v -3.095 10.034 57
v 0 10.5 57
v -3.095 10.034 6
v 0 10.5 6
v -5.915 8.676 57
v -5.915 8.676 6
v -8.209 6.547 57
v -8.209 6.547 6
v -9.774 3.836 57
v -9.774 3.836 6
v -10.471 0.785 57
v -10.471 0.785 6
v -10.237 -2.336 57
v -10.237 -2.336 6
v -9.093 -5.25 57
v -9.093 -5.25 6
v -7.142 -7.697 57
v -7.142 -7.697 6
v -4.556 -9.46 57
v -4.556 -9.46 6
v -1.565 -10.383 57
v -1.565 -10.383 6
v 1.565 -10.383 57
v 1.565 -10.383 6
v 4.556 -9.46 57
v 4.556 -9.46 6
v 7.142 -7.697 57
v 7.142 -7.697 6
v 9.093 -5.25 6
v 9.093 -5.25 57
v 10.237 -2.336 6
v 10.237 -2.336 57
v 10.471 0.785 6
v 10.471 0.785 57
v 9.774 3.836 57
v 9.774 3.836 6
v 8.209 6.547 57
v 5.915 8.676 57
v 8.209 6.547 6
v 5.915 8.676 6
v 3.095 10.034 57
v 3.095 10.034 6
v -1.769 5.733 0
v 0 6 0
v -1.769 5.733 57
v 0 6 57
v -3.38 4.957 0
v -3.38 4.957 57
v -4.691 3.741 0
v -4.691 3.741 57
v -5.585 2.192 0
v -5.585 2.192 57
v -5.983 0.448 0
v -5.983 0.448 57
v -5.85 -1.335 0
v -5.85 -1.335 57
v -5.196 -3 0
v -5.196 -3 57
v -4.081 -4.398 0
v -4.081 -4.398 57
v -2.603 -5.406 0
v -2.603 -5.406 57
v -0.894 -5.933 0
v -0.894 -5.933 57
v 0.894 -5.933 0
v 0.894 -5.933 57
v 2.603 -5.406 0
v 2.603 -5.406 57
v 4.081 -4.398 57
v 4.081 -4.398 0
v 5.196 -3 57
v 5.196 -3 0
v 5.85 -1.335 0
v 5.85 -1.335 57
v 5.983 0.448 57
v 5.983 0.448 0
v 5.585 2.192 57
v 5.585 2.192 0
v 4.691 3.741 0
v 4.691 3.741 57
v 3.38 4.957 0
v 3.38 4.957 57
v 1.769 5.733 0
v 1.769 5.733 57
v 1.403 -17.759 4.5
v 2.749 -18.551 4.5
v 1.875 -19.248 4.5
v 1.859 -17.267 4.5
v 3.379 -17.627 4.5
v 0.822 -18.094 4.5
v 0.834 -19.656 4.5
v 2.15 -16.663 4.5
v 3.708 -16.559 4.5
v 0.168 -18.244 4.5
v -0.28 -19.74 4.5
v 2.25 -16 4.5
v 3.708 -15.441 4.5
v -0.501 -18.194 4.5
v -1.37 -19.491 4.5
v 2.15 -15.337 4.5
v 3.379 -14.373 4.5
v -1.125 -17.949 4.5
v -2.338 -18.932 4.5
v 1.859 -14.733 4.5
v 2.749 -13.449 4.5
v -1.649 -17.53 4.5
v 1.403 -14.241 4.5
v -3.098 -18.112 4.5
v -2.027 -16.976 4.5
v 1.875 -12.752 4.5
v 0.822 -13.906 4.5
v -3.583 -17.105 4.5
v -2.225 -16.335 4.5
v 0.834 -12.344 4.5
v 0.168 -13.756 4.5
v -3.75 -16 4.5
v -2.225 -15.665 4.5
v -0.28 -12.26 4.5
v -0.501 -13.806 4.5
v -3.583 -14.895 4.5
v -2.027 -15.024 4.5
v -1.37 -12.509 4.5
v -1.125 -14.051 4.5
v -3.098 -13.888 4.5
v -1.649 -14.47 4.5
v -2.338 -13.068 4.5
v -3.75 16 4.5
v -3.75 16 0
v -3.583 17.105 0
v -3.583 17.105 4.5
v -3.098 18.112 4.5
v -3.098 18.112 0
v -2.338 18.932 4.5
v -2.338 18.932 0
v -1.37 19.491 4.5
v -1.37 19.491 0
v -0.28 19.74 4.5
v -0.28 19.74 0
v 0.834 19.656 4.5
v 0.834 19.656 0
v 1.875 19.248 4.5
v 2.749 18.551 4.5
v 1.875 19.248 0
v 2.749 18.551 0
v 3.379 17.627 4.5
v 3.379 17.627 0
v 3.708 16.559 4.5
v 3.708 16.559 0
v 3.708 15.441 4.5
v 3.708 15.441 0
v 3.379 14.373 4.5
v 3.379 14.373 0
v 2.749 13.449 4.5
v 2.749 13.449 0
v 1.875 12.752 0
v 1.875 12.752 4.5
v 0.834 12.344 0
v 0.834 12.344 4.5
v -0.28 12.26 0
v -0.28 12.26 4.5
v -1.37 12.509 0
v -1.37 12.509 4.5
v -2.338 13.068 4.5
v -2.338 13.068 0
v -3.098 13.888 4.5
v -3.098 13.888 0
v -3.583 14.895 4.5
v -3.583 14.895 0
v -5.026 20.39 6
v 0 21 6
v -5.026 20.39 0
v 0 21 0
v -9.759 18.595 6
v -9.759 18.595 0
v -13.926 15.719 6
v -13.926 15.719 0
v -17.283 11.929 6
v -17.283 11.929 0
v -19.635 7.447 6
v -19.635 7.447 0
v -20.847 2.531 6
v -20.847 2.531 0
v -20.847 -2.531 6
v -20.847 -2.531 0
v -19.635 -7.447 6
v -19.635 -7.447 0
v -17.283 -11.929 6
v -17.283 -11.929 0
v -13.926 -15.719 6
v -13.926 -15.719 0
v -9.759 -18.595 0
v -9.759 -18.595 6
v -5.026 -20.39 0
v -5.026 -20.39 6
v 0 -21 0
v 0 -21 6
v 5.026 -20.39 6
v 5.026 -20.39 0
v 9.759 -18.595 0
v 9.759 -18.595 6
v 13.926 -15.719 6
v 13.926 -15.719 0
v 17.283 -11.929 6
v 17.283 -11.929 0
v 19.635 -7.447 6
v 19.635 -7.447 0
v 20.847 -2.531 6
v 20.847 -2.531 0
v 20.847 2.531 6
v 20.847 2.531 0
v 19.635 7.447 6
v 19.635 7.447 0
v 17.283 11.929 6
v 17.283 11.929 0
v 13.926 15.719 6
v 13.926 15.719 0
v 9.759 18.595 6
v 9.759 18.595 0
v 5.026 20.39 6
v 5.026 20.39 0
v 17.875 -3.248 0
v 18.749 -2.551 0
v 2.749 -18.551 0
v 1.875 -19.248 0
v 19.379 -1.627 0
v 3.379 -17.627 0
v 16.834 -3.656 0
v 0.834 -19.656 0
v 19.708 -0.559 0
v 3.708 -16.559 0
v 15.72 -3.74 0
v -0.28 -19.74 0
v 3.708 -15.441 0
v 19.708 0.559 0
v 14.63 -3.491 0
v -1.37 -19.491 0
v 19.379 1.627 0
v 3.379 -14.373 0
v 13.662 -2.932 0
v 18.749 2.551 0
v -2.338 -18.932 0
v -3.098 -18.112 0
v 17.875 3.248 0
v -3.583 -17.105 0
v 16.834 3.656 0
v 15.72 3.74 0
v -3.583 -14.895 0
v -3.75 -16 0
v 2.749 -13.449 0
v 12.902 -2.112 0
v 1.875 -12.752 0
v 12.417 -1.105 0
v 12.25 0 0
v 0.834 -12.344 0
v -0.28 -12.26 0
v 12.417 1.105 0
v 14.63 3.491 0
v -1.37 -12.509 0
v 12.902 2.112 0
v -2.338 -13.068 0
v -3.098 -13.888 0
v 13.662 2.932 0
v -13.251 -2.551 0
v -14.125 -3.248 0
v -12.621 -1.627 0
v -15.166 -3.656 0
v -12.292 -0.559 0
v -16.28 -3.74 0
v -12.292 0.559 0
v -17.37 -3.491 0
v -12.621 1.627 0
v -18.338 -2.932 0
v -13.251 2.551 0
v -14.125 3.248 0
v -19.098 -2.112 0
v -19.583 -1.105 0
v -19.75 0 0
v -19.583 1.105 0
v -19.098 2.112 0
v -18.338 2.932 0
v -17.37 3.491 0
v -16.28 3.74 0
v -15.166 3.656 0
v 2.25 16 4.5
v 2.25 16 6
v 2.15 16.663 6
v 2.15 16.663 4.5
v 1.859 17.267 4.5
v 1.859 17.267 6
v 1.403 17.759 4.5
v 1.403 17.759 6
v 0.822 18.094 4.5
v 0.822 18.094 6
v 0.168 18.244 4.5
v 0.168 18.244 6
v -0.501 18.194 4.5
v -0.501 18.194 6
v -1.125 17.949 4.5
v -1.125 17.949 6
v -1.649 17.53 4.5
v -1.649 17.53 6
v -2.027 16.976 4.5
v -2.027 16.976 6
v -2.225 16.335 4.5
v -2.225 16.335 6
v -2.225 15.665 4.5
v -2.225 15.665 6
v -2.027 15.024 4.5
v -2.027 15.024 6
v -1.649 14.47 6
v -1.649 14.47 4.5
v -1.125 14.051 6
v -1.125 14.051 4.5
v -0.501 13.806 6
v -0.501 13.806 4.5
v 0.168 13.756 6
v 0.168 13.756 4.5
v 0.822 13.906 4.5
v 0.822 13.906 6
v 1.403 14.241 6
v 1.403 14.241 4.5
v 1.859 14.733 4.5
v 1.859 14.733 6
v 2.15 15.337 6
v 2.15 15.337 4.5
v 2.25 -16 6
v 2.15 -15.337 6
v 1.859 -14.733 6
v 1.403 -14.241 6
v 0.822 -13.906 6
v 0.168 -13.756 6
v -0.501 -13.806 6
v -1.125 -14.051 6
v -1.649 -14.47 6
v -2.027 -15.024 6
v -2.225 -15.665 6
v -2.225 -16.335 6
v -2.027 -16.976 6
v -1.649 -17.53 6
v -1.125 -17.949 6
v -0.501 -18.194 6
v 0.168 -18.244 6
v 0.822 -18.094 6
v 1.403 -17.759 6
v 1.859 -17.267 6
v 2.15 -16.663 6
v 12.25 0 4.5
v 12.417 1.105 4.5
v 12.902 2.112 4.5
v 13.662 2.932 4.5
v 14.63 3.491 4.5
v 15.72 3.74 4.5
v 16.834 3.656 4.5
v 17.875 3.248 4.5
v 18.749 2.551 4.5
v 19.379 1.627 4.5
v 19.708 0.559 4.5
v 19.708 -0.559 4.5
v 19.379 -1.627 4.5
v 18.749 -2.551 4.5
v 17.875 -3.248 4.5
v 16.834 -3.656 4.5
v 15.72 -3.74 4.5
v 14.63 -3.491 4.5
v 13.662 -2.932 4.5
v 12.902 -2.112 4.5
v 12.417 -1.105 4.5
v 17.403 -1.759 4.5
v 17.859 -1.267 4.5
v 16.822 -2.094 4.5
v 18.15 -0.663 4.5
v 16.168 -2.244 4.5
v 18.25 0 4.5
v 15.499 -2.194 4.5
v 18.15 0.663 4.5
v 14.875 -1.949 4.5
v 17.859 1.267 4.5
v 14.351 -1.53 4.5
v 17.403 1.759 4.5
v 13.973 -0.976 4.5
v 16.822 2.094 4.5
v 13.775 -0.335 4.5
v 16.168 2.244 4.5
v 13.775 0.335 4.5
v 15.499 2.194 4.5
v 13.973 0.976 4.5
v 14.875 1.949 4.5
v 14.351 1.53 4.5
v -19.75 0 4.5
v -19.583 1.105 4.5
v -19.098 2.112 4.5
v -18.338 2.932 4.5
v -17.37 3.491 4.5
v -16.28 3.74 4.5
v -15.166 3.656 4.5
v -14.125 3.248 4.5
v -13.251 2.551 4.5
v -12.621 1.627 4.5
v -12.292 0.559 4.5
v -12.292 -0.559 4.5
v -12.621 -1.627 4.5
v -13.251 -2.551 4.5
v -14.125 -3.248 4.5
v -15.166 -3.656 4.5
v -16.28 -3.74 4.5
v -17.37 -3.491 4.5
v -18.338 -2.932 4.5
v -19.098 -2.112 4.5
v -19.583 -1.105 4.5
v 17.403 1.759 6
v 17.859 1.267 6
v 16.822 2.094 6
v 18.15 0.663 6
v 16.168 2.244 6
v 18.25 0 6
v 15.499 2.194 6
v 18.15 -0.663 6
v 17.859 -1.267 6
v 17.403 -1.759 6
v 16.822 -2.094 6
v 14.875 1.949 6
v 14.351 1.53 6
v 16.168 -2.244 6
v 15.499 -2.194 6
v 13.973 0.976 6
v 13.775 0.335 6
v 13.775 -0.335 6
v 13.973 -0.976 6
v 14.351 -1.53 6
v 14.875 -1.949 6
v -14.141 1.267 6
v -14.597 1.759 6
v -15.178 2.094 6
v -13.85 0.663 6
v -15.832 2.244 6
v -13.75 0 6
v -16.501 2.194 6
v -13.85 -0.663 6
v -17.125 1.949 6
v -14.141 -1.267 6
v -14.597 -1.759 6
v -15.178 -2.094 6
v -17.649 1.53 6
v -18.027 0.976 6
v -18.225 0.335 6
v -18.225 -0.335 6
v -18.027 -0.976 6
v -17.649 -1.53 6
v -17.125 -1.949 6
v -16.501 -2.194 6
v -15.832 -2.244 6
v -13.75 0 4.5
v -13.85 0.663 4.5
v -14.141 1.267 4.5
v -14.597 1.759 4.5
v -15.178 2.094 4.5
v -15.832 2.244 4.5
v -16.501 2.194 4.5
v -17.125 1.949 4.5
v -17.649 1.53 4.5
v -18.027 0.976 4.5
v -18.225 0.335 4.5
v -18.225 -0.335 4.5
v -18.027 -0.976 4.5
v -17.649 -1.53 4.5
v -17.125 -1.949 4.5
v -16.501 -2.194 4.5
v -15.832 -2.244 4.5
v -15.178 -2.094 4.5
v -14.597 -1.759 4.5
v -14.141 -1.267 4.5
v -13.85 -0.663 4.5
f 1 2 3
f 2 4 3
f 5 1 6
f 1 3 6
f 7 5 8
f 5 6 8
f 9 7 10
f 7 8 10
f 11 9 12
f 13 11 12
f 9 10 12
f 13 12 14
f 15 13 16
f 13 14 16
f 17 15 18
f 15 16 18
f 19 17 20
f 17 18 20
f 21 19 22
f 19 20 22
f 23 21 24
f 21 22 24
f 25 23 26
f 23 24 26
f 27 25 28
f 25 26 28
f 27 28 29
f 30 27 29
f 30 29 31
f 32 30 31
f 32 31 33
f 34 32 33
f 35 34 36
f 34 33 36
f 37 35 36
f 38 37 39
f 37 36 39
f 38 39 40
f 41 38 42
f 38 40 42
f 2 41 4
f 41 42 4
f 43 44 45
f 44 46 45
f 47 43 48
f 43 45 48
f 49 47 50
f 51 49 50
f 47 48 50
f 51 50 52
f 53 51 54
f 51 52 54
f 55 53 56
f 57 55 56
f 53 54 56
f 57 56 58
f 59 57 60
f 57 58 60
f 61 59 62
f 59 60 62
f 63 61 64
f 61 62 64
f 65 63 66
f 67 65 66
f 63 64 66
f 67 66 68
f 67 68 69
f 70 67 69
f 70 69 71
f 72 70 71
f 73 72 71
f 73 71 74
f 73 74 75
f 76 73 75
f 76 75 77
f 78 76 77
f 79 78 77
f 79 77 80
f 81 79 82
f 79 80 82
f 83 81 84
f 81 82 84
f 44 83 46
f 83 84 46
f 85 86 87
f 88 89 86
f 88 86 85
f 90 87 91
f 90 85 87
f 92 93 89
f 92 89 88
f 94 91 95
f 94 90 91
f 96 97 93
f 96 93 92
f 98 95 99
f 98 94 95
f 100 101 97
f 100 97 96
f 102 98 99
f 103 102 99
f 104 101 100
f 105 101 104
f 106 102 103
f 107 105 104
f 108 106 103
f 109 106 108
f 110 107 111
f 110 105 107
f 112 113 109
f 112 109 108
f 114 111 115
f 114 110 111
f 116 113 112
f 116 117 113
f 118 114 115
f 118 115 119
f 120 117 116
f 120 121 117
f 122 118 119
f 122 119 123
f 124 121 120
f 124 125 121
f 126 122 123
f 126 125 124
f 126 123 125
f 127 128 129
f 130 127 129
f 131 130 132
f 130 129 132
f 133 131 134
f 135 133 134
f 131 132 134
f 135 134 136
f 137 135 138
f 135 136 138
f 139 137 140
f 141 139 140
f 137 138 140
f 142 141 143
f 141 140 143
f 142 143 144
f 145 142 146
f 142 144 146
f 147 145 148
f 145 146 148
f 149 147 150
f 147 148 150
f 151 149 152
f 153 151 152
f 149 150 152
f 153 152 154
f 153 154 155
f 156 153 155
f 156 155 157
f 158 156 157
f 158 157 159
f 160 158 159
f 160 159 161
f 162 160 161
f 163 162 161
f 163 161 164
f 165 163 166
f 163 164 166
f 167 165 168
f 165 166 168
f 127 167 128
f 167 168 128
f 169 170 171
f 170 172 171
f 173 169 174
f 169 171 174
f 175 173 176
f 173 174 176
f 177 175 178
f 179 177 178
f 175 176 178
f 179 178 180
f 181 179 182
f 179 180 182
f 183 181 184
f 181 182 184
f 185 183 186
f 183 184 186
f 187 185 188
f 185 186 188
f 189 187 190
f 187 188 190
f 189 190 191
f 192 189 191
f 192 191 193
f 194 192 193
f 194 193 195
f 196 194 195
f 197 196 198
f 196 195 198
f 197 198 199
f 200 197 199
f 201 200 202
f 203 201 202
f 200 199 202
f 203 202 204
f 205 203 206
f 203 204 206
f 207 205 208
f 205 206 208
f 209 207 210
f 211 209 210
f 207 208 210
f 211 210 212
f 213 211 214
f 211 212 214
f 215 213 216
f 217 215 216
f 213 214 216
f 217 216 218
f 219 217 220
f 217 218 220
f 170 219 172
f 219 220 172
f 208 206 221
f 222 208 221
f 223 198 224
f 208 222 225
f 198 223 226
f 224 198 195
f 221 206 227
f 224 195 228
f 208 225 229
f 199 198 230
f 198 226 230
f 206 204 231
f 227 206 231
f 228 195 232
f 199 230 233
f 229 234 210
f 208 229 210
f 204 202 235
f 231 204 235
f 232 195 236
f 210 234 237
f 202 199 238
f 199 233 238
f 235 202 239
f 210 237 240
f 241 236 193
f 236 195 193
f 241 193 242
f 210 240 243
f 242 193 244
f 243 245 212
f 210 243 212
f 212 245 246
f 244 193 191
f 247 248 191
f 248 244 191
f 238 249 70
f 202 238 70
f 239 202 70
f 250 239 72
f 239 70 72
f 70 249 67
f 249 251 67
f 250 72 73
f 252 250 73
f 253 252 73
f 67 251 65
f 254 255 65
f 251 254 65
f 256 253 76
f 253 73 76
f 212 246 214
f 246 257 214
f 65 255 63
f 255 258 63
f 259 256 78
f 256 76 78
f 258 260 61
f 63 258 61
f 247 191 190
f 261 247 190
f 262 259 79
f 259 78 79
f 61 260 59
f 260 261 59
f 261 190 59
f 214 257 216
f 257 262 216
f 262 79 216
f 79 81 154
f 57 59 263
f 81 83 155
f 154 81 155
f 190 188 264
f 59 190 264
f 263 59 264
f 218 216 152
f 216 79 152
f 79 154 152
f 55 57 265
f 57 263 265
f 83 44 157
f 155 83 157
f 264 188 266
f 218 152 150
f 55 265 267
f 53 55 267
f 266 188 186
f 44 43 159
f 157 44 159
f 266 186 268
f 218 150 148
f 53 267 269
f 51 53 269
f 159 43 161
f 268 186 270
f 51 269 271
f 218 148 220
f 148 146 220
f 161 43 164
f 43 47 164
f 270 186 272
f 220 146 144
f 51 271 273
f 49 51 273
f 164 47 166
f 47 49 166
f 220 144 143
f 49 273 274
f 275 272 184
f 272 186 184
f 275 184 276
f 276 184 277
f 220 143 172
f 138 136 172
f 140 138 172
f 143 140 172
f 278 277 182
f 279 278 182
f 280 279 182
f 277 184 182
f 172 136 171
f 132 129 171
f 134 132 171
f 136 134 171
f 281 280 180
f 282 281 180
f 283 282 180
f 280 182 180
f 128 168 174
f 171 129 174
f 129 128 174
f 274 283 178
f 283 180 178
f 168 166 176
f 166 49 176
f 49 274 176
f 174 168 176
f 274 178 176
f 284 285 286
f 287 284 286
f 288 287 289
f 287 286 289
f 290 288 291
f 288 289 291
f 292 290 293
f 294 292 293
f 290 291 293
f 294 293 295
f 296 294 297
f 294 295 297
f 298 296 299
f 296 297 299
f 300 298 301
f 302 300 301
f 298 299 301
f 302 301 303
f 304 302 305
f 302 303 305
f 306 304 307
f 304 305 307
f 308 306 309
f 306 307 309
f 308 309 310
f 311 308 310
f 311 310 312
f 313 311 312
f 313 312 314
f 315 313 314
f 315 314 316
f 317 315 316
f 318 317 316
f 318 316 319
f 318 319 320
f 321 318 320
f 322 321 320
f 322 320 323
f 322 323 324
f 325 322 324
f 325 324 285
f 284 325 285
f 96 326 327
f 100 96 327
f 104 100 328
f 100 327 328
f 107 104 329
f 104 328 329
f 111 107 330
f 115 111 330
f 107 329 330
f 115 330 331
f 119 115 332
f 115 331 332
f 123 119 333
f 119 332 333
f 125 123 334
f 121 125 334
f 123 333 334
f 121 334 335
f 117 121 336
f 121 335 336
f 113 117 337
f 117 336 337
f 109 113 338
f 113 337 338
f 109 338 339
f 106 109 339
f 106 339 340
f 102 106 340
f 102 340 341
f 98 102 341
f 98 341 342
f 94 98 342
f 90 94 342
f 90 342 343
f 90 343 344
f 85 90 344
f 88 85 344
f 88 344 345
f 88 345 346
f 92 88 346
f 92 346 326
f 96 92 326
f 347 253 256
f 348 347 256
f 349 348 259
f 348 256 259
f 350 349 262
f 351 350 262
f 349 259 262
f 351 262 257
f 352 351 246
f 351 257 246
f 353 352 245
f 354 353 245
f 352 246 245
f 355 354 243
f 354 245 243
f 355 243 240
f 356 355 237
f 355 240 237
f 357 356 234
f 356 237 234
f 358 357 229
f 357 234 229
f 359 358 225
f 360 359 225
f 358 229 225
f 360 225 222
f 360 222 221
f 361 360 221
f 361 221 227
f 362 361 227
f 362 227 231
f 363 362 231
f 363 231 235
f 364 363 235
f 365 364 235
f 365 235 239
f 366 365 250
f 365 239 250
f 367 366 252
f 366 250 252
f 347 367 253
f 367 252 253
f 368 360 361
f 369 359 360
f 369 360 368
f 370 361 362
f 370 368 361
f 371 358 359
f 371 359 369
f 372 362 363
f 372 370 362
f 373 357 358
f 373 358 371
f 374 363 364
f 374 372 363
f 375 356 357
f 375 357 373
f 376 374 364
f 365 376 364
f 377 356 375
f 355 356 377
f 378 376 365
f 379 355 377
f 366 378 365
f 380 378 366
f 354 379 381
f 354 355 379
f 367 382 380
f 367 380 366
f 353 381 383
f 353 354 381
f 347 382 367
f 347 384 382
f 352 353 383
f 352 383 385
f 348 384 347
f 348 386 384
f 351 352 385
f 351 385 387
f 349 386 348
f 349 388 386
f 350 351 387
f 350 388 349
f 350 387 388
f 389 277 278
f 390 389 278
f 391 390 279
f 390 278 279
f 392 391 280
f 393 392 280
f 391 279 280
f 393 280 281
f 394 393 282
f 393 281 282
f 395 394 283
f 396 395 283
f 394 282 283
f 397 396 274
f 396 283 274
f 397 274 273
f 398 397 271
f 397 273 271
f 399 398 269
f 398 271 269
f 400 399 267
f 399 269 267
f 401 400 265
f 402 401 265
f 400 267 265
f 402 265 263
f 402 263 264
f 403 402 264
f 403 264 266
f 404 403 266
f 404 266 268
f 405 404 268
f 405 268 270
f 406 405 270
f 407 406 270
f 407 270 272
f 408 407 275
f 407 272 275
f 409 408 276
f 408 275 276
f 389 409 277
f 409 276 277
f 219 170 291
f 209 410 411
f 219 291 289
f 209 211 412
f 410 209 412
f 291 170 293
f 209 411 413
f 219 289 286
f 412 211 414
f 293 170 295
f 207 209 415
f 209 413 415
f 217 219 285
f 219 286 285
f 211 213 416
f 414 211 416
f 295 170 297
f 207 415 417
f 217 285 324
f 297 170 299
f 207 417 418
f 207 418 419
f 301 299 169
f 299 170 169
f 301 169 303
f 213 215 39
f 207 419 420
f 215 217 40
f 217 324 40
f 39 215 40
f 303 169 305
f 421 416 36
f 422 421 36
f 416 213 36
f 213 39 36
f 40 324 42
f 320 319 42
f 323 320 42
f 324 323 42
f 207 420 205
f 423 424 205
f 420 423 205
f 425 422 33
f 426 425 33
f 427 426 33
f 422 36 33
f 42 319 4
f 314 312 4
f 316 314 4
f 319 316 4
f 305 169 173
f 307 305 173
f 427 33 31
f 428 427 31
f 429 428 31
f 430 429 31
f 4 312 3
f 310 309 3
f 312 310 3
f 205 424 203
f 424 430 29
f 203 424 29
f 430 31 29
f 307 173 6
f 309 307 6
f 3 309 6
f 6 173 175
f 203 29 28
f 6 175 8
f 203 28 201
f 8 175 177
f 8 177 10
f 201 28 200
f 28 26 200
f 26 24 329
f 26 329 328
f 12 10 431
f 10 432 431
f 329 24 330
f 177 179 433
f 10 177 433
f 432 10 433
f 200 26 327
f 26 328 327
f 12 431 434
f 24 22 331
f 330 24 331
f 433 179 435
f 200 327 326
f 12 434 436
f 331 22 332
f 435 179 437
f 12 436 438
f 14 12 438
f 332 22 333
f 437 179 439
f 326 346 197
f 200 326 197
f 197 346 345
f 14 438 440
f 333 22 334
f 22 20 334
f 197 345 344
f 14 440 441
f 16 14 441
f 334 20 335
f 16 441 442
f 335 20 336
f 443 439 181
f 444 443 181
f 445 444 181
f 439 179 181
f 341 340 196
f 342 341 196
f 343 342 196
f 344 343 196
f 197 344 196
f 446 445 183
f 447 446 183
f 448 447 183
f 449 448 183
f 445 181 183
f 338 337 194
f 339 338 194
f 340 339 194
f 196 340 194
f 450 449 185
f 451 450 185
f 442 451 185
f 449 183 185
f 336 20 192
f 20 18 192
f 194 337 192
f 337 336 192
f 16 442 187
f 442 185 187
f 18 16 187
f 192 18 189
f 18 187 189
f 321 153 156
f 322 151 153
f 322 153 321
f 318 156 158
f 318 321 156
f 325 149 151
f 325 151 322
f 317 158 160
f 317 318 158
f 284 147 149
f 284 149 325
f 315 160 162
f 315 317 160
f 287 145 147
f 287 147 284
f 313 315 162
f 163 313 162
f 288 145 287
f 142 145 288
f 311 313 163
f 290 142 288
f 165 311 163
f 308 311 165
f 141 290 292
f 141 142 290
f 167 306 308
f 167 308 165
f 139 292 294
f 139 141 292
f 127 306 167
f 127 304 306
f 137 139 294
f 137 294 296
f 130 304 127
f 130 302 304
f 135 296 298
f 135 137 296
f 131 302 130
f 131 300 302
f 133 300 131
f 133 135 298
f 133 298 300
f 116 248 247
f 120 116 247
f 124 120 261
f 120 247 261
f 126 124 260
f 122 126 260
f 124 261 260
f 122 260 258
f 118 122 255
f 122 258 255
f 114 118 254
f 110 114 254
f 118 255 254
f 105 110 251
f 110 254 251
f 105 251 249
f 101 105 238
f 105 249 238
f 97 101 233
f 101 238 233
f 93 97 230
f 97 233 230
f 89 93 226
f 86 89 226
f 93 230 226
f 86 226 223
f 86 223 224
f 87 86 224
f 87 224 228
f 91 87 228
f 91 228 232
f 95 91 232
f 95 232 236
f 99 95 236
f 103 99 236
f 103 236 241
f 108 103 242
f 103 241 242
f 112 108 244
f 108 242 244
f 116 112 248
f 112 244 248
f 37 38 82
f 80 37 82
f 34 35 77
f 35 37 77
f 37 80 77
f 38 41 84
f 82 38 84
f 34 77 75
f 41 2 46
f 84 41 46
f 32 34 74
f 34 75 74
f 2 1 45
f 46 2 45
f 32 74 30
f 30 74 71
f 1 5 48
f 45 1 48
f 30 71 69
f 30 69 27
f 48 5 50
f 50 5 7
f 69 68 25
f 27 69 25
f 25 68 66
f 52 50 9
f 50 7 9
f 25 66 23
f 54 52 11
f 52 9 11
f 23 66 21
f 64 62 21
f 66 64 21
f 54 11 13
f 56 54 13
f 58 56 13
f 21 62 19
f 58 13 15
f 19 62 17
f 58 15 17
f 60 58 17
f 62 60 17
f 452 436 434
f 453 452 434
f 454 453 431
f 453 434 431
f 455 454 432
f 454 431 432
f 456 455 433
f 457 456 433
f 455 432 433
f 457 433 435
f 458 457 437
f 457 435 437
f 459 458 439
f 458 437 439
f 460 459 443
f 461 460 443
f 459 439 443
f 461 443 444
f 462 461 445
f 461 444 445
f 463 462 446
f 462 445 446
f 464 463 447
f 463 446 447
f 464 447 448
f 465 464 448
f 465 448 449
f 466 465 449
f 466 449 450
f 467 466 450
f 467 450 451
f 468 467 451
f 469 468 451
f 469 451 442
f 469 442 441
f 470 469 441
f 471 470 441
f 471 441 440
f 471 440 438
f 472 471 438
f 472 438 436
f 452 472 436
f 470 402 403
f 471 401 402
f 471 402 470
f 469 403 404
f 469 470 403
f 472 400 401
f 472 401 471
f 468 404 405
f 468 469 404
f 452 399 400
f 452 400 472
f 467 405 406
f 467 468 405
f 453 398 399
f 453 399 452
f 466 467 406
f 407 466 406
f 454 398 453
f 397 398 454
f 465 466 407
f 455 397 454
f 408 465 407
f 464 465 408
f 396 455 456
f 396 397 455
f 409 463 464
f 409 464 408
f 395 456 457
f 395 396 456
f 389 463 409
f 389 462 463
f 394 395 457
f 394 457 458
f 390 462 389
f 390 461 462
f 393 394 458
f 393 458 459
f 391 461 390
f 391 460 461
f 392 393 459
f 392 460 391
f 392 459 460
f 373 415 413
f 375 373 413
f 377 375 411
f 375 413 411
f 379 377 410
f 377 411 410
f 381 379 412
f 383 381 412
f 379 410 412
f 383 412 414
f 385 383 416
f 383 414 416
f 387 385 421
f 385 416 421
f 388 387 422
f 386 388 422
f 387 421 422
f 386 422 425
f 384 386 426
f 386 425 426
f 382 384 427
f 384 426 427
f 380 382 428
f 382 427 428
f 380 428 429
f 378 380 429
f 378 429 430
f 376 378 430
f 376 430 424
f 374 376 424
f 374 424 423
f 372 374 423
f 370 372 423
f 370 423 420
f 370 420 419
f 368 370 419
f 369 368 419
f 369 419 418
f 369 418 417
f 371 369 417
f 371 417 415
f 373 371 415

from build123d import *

# Parameters (mm, degrees)
CROQUIS6_R            = 2.25
CORTAR_EXTRUIR3_DEPTH = 7
CROQUIS7_R            = 3.75
CORTAR_EXTRUIR4_DEPTH = 4.5


with BuildPart() as part:
    # Croquis5 → Revolución1 (revolve)
    with BuildSketch(Plane(origin=(0, 0, 0), x_dir=(0, 0, -1), z_dir=(1, 0, 0))):
        Polygon((0, 6), (-57, 6), (-57, 10.5), (-6, 10.5), (-6, 21), (0, 21), align=None)
    revolve(axis=Axis((0, 0, 0), (0, 0, 1)))

    # Croquis6 → Cortar-Extruir3 (cut, through all)
    with BuildSketch(Plane.XY.offset(6)):
        with Locations((0, 16)):
            Circle(CROQUIS6_R)
        with Locations((16, 0)):
            Circle(CROQUIS6_R)
        with Locations((0, -16)):
            Circle(CROQUIS6_R)
        with Locations((-16, 0)):
            Circle(CROQUIS6_R)
    extrude(amount=-CORTAR_EXTRUIR3_DEPTH, mode=Mode.SUBTRACT)

    # Croquis7 → Cortar-Extruir4 (cut)
    with BuildSketch(Plane(origin=(0, 0, 0), x_dir=(-1, 0, 0), z_dir=(0, 0, -1))):
        with Locations((0, 16)):
            Circle(CROQUIS7_R)
        with Locations((16, 0)):
            Circle(CROQUIS7_R)
        with Locations((0, -16)):
            Circle(CROQUIS7_R)
        with Locations((-16, 0)):
            Circle(CROQUIS7_R)
    extrude(amount=-CORTAR_EXTRUIR4_DEPTH, mode=Mode.SUBTRACT)


solid = part.part
